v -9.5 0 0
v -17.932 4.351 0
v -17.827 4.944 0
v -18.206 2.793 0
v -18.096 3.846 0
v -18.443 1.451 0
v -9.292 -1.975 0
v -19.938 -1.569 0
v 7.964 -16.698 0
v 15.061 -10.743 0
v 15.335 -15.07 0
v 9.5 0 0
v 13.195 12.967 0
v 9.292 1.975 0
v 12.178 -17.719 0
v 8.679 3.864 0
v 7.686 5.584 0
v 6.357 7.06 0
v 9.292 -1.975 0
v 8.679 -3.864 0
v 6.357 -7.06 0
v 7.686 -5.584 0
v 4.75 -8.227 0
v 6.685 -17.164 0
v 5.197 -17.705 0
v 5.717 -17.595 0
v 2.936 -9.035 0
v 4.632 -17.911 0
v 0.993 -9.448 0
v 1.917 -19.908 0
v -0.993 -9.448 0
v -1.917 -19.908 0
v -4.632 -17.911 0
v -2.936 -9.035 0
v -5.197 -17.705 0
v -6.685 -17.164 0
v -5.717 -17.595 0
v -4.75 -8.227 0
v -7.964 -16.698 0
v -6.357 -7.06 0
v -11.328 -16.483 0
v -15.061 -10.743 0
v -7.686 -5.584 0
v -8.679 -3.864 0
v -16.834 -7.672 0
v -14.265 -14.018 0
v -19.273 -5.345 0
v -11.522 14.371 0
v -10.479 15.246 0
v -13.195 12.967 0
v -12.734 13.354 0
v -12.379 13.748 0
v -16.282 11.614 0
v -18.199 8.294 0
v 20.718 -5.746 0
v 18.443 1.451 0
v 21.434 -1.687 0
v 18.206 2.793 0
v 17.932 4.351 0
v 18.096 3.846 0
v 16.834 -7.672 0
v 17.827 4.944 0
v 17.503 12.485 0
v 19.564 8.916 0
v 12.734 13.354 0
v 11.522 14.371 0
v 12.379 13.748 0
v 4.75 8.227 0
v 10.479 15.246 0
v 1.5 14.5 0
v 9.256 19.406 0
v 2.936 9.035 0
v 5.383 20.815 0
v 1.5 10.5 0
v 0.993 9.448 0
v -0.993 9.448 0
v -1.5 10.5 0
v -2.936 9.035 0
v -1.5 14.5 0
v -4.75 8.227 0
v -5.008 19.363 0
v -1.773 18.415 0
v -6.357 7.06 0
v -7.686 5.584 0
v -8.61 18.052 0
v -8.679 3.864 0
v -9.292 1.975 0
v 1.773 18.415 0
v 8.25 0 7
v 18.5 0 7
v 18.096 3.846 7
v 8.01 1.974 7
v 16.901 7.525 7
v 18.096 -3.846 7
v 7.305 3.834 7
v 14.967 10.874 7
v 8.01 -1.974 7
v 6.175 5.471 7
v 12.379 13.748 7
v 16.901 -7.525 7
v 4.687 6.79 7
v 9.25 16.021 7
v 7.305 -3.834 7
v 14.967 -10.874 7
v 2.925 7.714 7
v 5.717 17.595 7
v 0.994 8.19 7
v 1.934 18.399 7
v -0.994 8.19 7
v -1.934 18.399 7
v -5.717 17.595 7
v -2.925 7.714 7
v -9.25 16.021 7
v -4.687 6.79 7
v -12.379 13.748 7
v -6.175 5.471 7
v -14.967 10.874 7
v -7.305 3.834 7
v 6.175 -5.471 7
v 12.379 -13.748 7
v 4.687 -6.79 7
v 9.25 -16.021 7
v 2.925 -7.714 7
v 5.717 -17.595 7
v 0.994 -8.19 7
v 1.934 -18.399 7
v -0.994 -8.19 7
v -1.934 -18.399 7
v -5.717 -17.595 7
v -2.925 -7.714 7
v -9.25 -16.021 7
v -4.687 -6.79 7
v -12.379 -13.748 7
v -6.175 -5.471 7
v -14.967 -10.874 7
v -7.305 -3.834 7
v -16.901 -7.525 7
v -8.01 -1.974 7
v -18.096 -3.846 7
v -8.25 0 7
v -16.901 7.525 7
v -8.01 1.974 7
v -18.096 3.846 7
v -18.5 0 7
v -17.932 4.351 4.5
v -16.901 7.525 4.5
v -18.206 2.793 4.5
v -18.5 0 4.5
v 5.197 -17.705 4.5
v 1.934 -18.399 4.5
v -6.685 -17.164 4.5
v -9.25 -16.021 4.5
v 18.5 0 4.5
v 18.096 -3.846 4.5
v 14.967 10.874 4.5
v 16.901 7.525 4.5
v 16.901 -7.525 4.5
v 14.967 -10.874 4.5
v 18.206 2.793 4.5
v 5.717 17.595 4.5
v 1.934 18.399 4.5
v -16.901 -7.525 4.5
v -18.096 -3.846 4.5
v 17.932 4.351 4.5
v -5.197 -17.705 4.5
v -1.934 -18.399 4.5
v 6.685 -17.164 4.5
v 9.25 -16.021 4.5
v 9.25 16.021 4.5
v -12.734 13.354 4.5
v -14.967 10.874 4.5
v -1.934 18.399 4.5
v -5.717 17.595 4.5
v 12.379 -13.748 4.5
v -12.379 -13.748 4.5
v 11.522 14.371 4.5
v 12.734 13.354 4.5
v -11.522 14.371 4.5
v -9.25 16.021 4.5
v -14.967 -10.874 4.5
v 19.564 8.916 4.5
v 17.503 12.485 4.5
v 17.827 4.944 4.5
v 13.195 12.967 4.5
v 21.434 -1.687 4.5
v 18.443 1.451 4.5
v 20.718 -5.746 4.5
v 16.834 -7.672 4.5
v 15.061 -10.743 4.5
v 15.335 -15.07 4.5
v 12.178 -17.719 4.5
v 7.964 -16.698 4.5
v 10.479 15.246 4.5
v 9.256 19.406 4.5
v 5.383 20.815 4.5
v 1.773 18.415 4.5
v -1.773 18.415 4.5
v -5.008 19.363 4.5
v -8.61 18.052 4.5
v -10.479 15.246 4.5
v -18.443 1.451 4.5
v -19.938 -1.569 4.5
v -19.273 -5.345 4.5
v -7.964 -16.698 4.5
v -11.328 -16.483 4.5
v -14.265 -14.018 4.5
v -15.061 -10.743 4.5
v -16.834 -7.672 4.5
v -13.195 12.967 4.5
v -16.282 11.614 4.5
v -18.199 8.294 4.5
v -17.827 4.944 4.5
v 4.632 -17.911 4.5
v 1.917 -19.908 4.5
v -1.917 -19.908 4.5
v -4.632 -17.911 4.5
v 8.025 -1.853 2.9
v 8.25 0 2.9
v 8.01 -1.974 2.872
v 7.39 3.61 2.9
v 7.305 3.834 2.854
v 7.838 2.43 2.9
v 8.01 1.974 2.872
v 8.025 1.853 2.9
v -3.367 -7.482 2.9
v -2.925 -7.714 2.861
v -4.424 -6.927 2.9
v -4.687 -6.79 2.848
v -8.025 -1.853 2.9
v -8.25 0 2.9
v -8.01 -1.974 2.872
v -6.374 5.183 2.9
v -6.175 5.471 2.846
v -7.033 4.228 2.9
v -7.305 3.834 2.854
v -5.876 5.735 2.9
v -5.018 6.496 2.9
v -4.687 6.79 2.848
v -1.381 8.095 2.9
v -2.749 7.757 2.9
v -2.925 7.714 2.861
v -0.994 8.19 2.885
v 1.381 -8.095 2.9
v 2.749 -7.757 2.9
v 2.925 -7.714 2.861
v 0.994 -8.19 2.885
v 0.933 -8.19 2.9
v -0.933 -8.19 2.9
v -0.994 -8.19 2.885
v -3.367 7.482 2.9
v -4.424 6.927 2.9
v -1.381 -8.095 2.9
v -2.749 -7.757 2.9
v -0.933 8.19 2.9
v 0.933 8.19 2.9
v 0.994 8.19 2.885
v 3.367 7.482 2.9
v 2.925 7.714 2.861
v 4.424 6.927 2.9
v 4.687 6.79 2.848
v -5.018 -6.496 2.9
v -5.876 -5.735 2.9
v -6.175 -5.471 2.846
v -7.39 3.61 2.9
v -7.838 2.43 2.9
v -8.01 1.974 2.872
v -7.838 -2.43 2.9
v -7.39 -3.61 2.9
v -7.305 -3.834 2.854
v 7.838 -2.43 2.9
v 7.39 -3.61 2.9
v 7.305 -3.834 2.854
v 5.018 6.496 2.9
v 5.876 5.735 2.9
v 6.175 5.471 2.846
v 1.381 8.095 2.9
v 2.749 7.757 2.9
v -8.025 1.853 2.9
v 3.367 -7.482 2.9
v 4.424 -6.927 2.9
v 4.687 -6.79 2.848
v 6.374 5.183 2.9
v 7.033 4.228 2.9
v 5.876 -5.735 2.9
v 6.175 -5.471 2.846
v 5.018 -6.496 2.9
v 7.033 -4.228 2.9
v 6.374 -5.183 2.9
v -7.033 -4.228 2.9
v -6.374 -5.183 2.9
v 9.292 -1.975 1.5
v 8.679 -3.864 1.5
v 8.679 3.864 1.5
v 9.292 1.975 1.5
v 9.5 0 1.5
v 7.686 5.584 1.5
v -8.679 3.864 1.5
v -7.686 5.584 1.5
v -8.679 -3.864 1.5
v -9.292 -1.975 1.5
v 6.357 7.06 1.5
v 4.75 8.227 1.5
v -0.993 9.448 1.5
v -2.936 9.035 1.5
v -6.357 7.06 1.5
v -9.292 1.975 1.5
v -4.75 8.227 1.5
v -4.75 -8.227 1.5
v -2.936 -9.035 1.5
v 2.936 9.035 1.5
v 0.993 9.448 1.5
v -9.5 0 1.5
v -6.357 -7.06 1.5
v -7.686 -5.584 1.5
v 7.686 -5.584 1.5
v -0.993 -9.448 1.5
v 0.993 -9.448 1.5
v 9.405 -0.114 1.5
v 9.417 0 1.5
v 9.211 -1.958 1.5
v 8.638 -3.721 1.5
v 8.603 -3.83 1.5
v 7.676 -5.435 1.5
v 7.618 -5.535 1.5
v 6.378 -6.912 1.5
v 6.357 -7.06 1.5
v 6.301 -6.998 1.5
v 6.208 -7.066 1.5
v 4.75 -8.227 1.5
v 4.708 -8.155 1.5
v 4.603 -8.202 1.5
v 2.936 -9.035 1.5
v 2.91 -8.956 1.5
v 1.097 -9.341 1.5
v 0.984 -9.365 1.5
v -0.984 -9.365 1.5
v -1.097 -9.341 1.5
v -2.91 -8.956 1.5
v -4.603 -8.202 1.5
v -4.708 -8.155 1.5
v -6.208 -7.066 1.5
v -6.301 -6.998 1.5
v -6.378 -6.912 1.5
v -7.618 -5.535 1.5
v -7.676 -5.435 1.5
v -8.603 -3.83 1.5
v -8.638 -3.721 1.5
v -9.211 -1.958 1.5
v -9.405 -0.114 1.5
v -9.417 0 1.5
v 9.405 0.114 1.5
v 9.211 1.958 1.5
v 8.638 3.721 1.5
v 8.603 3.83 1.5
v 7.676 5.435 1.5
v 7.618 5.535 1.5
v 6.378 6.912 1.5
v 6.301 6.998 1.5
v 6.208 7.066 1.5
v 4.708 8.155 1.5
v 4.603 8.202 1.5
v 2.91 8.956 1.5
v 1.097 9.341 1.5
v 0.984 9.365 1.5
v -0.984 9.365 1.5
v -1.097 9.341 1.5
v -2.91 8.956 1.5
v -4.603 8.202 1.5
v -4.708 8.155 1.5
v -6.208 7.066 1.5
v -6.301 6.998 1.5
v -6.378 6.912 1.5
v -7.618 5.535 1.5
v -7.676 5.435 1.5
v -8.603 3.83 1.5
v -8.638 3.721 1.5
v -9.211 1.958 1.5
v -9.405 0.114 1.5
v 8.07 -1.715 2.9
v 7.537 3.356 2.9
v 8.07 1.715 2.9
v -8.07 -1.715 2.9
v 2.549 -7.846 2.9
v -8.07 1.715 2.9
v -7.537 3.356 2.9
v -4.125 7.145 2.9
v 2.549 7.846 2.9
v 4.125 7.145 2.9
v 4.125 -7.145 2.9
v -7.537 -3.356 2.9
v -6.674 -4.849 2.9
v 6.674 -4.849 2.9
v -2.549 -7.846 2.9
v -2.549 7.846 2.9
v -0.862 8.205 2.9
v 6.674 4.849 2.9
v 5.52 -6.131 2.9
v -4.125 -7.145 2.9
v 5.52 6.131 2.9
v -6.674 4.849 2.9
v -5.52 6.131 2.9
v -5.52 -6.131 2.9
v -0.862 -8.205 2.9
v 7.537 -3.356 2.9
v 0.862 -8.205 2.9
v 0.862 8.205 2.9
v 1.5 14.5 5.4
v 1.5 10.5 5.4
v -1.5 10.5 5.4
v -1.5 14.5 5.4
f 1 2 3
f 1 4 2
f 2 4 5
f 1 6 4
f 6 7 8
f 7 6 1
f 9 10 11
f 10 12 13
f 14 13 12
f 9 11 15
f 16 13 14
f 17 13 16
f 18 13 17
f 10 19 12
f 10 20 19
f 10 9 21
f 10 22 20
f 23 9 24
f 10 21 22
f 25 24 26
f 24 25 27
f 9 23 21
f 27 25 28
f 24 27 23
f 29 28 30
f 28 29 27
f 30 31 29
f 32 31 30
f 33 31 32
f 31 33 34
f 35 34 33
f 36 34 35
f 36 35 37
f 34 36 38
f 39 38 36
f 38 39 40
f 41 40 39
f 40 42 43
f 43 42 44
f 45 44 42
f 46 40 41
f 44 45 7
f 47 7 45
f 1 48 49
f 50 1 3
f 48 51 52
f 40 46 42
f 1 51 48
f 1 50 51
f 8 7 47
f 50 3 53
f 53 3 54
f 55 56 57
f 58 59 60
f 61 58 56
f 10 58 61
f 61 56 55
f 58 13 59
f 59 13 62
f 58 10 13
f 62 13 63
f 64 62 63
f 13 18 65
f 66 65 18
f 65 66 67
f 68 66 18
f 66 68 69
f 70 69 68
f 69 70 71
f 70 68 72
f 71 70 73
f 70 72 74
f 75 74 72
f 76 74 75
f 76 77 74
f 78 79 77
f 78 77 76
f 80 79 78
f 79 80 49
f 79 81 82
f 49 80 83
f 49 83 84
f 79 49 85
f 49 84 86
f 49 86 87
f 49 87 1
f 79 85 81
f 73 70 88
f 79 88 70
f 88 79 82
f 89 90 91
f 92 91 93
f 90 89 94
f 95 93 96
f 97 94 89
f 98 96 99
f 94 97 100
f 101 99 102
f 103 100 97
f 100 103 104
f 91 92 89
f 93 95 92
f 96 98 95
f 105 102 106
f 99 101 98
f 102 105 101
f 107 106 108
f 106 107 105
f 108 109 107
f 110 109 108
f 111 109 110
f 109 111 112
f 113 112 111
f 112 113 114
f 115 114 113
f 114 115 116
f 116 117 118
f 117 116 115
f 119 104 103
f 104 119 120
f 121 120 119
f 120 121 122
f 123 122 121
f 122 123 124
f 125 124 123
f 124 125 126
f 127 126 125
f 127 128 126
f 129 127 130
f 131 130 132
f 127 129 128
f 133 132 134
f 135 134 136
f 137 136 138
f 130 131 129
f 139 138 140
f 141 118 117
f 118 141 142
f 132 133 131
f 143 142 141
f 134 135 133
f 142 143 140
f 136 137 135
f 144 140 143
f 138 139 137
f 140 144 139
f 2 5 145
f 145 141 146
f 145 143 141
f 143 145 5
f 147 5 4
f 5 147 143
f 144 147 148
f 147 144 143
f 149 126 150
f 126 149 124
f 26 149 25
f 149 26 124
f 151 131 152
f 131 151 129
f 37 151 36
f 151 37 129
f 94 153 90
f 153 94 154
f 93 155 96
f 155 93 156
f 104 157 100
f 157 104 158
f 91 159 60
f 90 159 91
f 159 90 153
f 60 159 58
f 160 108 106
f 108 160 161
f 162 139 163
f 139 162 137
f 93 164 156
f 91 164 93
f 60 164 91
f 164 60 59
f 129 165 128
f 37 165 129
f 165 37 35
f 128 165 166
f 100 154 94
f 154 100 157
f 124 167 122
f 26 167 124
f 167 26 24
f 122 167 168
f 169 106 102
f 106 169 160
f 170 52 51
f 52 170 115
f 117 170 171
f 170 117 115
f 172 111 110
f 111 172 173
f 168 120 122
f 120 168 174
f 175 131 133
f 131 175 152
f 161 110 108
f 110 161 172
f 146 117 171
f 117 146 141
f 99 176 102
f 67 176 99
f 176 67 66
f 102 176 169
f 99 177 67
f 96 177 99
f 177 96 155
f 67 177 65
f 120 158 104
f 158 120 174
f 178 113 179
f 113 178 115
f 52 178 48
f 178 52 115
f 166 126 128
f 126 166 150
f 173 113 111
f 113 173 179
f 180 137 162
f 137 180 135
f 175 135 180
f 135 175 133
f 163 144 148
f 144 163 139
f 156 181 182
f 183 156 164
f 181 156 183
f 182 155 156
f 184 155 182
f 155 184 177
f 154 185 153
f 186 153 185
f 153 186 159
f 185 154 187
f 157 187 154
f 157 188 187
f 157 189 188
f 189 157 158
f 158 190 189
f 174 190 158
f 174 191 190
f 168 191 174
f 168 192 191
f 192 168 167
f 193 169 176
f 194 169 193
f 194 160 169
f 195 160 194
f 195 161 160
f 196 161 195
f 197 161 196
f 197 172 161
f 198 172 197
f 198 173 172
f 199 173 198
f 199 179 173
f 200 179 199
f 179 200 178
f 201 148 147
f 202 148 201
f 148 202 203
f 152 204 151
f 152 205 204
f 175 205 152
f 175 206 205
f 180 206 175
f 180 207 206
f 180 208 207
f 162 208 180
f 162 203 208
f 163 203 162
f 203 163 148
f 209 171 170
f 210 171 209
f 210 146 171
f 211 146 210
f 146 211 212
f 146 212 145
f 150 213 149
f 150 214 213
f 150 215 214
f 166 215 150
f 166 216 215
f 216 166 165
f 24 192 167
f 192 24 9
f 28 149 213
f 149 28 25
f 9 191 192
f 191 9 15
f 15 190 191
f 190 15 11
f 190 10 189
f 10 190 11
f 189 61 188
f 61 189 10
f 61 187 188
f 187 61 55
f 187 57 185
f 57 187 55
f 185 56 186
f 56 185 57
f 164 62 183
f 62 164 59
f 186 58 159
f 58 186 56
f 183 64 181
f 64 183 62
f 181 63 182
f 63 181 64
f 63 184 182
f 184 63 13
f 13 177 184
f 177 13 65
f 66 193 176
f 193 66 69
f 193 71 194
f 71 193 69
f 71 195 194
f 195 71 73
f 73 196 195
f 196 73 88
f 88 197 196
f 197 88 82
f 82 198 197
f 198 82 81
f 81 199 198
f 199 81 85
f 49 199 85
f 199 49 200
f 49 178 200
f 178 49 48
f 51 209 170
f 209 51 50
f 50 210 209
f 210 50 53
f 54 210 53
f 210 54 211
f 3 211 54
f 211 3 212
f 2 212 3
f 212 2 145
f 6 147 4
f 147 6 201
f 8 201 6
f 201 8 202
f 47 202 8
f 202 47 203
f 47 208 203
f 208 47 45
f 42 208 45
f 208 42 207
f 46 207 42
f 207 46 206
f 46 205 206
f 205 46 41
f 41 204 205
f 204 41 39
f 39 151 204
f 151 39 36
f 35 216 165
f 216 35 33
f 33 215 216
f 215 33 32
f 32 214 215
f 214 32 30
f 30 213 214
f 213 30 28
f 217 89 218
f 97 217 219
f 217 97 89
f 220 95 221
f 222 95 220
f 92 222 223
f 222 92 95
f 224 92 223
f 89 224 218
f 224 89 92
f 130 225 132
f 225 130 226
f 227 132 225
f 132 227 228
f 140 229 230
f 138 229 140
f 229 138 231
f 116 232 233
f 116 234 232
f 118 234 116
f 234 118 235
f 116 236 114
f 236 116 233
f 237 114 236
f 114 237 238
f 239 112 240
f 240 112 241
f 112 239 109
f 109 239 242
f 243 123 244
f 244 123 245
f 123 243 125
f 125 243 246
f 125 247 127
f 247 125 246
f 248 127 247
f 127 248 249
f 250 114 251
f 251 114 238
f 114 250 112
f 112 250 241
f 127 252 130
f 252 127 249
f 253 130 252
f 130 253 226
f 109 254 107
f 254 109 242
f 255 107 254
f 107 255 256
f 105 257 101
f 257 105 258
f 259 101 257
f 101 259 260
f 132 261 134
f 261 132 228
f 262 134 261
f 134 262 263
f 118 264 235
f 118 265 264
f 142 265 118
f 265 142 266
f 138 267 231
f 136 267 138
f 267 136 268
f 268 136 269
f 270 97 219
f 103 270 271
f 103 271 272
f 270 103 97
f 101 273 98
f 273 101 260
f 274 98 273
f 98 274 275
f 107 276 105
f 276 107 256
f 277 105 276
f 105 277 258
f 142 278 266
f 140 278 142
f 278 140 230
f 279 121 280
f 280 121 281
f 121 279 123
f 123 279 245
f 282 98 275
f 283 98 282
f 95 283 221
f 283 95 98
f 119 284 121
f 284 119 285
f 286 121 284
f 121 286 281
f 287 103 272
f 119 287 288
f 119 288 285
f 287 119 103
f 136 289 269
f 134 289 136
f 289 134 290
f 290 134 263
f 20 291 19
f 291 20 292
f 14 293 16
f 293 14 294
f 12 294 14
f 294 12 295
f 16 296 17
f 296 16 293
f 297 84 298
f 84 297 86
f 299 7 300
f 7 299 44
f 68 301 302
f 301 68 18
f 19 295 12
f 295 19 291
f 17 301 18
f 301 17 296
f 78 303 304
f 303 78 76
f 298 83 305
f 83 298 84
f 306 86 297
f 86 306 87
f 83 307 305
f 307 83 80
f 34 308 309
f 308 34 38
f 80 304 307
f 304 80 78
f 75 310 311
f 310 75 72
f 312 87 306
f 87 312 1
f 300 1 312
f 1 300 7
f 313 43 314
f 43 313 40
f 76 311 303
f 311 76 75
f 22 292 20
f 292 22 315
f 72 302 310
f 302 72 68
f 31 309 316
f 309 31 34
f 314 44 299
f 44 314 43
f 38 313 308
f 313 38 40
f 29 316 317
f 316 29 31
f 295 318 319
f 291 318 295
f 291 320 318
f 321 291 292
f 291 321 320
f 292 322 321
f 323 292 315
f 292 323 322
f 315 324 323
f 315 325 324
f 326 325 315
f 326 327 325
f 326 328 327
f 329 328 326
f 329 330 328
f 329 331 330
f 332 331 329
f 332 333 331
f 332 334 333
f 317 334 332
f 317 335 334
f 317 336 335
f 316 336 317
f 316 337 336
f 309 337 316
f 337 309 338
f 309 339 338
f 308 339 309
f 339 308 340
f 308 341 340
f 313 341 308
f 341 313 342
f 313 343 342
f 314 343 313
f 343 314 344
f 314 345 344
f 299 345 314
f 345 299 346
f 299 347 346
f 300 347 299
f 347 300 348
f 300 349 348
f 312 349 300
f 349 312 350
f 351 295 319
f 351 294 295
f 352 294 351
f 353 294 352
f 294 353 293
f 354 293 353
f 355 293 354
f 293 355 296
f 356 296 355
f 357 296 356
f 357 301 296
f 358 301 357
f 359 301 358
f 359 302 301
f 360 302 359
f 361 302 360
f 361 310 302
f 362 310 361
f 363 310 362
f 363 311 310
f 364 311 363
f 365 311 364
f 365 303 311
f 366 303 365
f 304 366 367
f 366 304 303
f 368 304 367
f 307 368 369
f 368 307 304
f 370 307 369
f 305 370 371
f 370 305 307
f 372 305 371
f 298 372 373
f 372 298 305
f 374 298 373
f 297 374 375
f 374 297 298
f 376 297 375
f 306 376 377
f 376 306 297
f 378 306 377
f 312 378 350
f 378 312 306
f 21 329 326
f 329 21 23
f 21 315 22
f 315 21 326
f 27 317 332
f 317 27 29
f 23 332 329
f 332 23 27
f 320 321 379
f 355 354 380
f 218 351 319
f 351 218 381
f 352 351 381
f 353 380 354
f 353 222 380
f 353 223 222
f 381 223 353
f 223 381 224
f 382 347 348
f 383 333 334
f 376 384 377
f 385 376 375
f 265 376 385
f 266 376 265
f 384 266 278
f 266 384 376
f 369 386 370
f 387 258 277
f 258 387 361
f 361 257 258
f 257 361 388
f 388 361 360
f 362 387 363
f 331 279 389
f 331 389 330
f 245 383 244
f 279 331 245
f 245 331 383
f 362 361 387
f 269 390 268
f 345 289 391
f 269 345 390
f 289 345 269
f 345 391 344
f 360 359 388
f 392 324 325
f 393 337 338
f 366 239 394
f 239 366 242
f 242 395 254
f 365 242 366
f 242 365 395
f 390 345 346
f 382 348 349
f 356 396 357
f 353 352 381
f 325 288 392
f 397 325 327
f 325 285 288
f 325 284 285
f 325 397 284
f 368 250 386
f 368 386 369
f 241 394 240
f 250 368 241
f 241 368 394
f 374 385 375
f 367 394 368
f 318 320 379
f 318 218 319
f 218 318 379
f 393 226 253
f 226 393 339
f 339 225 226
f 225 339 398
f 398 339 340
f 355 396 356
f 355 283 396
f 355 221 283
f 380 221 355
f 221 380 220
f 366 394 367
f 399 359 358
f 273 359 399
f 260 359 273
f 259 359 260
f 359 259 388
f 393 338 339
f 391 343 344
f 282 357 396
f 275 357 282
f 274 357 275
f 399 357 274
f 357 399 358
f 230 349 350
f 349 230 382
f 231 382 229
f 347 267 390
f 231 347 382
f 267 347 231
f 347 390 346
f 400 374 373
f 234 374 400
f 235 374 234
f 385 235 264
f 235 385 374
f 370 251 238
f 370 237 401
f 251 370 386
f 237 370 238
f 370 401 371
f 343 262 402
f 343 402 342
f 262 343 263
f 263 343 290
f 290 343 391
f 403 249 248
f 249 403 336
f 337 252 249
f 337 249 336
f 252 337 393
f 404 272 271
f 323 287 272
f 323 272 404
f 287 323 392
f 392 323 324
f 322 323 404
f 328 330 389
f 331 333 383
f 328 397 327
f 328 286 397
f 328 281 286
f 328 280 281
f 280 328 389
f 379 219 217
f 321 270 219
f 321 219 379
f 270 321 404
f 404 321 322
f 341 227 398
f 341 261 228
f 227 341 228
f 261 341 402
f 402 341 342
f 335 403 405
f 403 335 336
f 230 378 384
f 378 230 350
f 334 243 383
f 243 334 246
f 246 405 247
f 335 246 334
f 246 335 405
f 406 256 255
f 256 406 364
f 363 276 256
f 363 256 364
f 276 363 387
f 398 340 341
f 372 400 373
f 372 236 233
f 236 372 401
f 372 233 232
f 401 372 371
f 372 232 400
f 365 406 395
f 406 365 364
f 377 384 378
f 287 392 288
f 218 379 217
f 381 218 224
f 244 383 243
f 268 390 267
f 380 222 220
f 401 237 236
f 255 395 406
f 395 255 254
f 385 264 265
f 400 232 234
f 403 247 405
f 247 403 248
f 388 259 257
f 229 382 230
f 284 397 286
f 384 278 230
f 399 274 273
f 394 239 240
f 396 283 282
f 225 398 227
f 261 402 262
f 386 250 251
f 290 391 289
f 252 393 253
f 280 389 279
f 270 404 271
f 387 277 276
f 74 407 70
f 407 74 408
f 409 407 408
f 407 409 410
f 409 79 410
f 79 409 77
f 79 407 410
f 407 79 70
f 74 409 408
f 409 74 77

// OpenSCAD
// file: Cam-as-18-Sided-Polygon.scad
/*  Provides a common method / function / module to 3D Print an 18 sided polygon for a cam used by Elna Supermatic, Elna SU machines sewing machines, matching with the 18 punches made by the needle per each rotation of a cam.

    Copyright (C) 2020  L Komandur

    This program is free software: you can redistribute it and/or modify
    it under the terms of the GNU General Public License as published by
    the Free Software Foundation, either version 3 of the License, or
    (at your option) any later version.

    This program is distributed in the hope that it will be useful,
    but WITHOUT ANY WARRANTY; without even the implied warranty of
    MERCHANTABILITY or FITNESS FOR A PARTICULAR PURPOSE.  See the
    GNU General Public License for more details.

    You should have received a copy of the GNU General Public License
    along with this program.  If not, see <https://www.gnu.org/licenses/>.
*/

thickest_cyl_rad = 17;
skirting_width=1.5;

angle_of_side = 11;
min_radius = thickest_cyl_rad+skirting_width;

module plotpoly(p1,p2,p3,p4,p5,p6,p7,p8,p9,p10,p11,p12,p13,p14,p15,p16,p17,p18) {
	//scale ([-1,1])
	polygon( points = [
	[(min_radius + p1)*sin(0-angle_of_side/2), (min_radius + p1)*cos(0-angle_of_side/2)],
	[(min_radius + p1)*sin(0+angle_of_side/2), (min_radius + p1)*cos(0+angle_of_side/2)],
	[(min_radius + p2)*sin(20-angle_of_side/2), (min_radius + p2)*cos(20-angle_of_side/2)],	
	[(min_radius + p2)*sin(20+angle_of_side/2), (min_radius + p2)*cos(20+angle_of_side/2)],	
	[(min_radius + p3)*sin(40-angle_of_side/2), (min_radius + p3)*cos(40-angle_of_side/2)],	
	[(min_radius + p3)*sin(40+angle_of_side/2), (min_radius + p3)*cos(40+angle_of_side/2)],	
	[(min_radius + p4)*sin(60-angle_of_side/2), (min_radius + p4)*cos(60-angle_of_side/2)],	
	[(min_radius + p4)*sin(60+angle_of_side/2), (min_radius + p4)*cos(60+angle_of_side/2)],	
	[(min_radius + p5)*sin(80-angle_of_side/2), (min_radius + p5)*cos(80-angle_of_side/2)],	
	[(min_radius + p5)*sin(80+angle_of_side/2), (min_radius + p5)*cos(80+angle_of_side/2)],	
	[(min_radius + p6)*sin(100-angle_of_side/2), (min_radius + p6)*cos(100-angle_of_side/2)],	
	[(min_radius + p6)*sin(100+angle_of_side/2), (min_radius + p6)*cos(100+angle_of_side/2)],	
	[(min_radius + p7)*sin(120-angle_of_side/2), (min_radius + p7)*cos(120-angle_of_side/2)],	
	[(min_radius + p7)*sin(120+angle_of_side/2), (min_radius + p7)*cos(120+angle_of_side/2)],	
	[(min_radius + p8)*sin(140-angle_of_side/2), (min_radius + p8)*cos(140-angle_of_side/2)],	
	[(min_radius + p8)*sin(140+angle_of_side/2), (min_radius + p8)*cos(140+angle_of_side/2)],	
	[(min_radius + p9)*sin(160-angle_of_side/2), (min_radius + p9)*cos(160-angle_of_side/2)],	
	[(min_radius + p9)*sin(160+angle_of_side/2), (min_radius + p9)*cos(160+angle_of_side/2)],	
	[(min_radius + p10)*sin(180-angle_of_side/2), (min_radius + p10)*cos(180-angle_of_side/2)],	
	[(min_radius + p10)*sin(180+angle_of_side/2), (min_radius + p10)*cos(180+angle_of_side/2)],	
	[(min_radius + p11)*sin(200-angle_of_side/2), (min_radius + p11)*cos(200-angle_of_side/2)],	
	[(min_radius + p11)*sin(200+angle_of_side/2), (min_radius + p11)*cos(200+angle_of_side/2)],	
	[(min_radius + p12)*sin(220-angle_of_side/2), (min_radius + p12)*cos(220-angle_of_side/2)],	
	[(min_radius + p12)*sin(220+angle_of_side/2), (min_radius + p12)*cos(220+angle_of_side/2)],	
	[(min_radius + p13)*sin(240-angle_of_side/2), (min_radius + p13)*cos(240-angle_of_side/2)],	
	[(min_radius + p13)*sin(240+angle_of_side/2), (min_radius + p13)*cos(240+angle_of_side/2)],	
	[(min_radius + p14)*sin(260-angle_of_side/2), (min_radius + p14)*cos(260-angle_of_side/2)],	
	[(min_radius + p14)*sin(260+angle_of_side/2), (min_radius + p14)*cos(260+angle_of_side/2)],	
	[(min_radius + p15)*sin(280-angle_of_side/2), (min_radius + p15)*cos(280-angle_of_side/2)],	
	[(min_radius + p15)*sin(280+angle_of_side/2), (min_radius + p15)*cos(280+angle_of_side/2)],	
	[(min_radius + p16)*sin(300-angle_of_side/2), (min_radius + p16)*cos(300-angle_of_side/2)],		
	[(min_radius + p16)*sin(300+angle_of_side/2), (min_radius + p16)*cos(300+angle_of_side/2)],		
	[(min_radius + p17)*sin(320-angle_of_side/2), (min_radius + p17)*cos(320-angle_of_side/2)],	
	[(min_radius + p17)*sin(320+angle_of_side/2), (min_radius + p17)*cos(320+angle_of_side/2)],	
	[(min_radius + p18)*sin(340-angle_of_side/2), (min_radius + p18)*cos(340-angle_of_side/2)],
	[(min_radius + p18)*sin(340+angle_of_side/2), (min_radius + p18)*cos(340+angle_of_side/2)]
	]);

}
// main file
/*  3D Prints a "single cam" similar to Cam No 33 of Elna Supermatic, Elna SU machines sewing machines.

    Copyright (C) 2020  L Komandur

    This program is free software: you can redistribute it and/or modify
    it under the terms of the GNU General Public License as published by
    the Free Software Foundation, either version 3 of the License, or
    (at your option) any later version.

    This program is distributed in the hope that it will be useful,
    but WITHOUT ANY WARRANTY; without even the implied warranty of
    MERCHANTABILITY or FITNESS FOR A PARTICULAR PURPOSE.  See the
    GNU General Public License for more details.

    You should have received a copy of the GNU General Public License
    along with this program.  If not, see <https://www.gnu.org/licenses/>.
*/

use <Cam-as-18-Sided-Polygon.scad>

double_disc_thickness = 9;

disc_thickness = 7; // 7 for single, 9 for double
thickest_cyl_rad = 17;

lobe_thickness = 4.5;
inner_hole_rad = 8.25;
hole_bigger_rad = 9.5;
bigger_hole_ht = 1.5;
cut_errors = 0.1;
hole_cone_ht = 1.5;
skirting = 0;


gap_bet_cloth_needle_cams = disc_thickness-2*skirting-2*lobe_thickness;

gap_to_transporthole = 1;

transporthole_width = 3;
transporthole_depth = 5.5;
transporthole_length  = 4;

peak=3;
c=peak/2;
l=0;
r=peak;
cl=peak/4;
cr=peak*3/4;
skirting_width=1.5;
min_radius = thickest_cyl_rad+skirting_width;


module letter(l,font="font.dxf",h=100,i=0) {
	union() {
		linear_extrude( height=h) import(font, layer=l[i]);
		translate([dxf_dim(file=font, name="advx",layer=l[i]),
			dxf_dim(file=font, name="advy",layer=l[i]),
			0])
			child();
	}
}

module word(wrd,font="font.dxf",h=100,i=0) {
	if(i < len(wrd)) {
		letter(wrd,font,h,i) word(wrd,font,h,i+1);
	} else {
		child();
	}
}


module print_s33_cam(x,y) {

	translate([x, y, 0]) rotate(a=[0,0,0]) difference() {
		union() {
			// tall INNER tall cylinder that excludes skirting 
		cylinder(h = disc_thickness, r = thickest_cyl_rad);
	
			// 2nd bigger cylinder shared between 2 cams and skirting; any sewing information would go here.
	
		translate([0, 0, skirting]) cylinder(h = disc_thickness - skirting*2, r = thickest_cyl_rad + skirting_width);
		translate([0, 0, skirting])
		linear_extrude (height  = lobe_thickness)
			plotpoly(l,r,l,r,l,r,l,r,l,c,l,c,l,c,l,c,l,c);
		
	
		}
	
		// Subtract the inner hole. Be very generous.
		translate([0, 0, disc_thickness/2])
			cylinder(h = disc_thickness+1, r = inner_hole_rad, center = true);
	
		// Subtract the lower wider hole
		translate([0, 0, -cut_errors])
			cylinder(h = bigger_hole_ht+cut_errors, r = hole_bigger_rad);
	
	
		// Subtract the cone between wide hole and smaller hole.
		translate([0, 0, bigger_hole_ht-cut_errors])
			cylinder(h = hole_cone_ht, r1 = hole_bigger_rad, r2 = inner_hole_rad);
	
		// Subtract the upper cone the disk locks on the sewing machine post (only for double cams).
		translate([0, 0, double_disc_thickness-skirting-2+cut_errors])
			cylinder(h = 2, r = hole_bigger_rad);
	
		// Initials on the side of transport hole as depressions (top side while printing).
	
		for (letter_depth = [1:6])
		{
			rotate(a=[0, 0, 0]) translate([-2.25, 10.5, disc_thickness-0.1*letter_depth]) scale(0.0015) letter("O");
			rotate(a=[0, 0, 0]) translate([-1.5, 11.25, disc_thickness-0.1*letter_depth]) scale(0.001) letter("O");
			rotate(a=[0, 0, 140]) translate([-8, 10, disc_thickness-0.1*letter_depth]) scale(0.002) letter("E");
			rotate(a=[0, 0, 130]) translate([-4, 11, disc_thickness-0.1*letter_depth]) scale(0.002) letter("L");
			rotate(a=[0, 0, 120]) translate([-0, 11, disc_thickness-0.1*letter_depth]) scale(0.002) letter("N");
			rotate(a=[0, 0, 110]) translate([4, 10, disc_thickness-0.1*letter_depth]) scale(0.002) letter("A");

			rotate(a=[0, 0, 115]) translate([-9, -15, disc_thickness-0.1*letter_depth]) scale(0.002) letter(" ");
			rotate(a=[0, 0, 115]) translate([-4, -16, disc_thickness-0.1*letter_depth]) scale(0.002) letter("3");
			rotate(a=[0, 0, 115]) translate([2, -16,disc_thickness-0.1*letter_depth]) scale(0.002) letter("3");
		}
		// Transport hole made as a rectangular  hole
		difference() {
			rotate(a=[0, 0, 0]) translate([0, hole_bigger_rad + gap_to_transporthole + transporthole_length/2, transporthole_depth/2-cut_errors])
				cube(size = [transporthole_width, transporthole_length, transporthole_depth], center = true);
	
		}
	}
}

print_s33_cam(0,0);
